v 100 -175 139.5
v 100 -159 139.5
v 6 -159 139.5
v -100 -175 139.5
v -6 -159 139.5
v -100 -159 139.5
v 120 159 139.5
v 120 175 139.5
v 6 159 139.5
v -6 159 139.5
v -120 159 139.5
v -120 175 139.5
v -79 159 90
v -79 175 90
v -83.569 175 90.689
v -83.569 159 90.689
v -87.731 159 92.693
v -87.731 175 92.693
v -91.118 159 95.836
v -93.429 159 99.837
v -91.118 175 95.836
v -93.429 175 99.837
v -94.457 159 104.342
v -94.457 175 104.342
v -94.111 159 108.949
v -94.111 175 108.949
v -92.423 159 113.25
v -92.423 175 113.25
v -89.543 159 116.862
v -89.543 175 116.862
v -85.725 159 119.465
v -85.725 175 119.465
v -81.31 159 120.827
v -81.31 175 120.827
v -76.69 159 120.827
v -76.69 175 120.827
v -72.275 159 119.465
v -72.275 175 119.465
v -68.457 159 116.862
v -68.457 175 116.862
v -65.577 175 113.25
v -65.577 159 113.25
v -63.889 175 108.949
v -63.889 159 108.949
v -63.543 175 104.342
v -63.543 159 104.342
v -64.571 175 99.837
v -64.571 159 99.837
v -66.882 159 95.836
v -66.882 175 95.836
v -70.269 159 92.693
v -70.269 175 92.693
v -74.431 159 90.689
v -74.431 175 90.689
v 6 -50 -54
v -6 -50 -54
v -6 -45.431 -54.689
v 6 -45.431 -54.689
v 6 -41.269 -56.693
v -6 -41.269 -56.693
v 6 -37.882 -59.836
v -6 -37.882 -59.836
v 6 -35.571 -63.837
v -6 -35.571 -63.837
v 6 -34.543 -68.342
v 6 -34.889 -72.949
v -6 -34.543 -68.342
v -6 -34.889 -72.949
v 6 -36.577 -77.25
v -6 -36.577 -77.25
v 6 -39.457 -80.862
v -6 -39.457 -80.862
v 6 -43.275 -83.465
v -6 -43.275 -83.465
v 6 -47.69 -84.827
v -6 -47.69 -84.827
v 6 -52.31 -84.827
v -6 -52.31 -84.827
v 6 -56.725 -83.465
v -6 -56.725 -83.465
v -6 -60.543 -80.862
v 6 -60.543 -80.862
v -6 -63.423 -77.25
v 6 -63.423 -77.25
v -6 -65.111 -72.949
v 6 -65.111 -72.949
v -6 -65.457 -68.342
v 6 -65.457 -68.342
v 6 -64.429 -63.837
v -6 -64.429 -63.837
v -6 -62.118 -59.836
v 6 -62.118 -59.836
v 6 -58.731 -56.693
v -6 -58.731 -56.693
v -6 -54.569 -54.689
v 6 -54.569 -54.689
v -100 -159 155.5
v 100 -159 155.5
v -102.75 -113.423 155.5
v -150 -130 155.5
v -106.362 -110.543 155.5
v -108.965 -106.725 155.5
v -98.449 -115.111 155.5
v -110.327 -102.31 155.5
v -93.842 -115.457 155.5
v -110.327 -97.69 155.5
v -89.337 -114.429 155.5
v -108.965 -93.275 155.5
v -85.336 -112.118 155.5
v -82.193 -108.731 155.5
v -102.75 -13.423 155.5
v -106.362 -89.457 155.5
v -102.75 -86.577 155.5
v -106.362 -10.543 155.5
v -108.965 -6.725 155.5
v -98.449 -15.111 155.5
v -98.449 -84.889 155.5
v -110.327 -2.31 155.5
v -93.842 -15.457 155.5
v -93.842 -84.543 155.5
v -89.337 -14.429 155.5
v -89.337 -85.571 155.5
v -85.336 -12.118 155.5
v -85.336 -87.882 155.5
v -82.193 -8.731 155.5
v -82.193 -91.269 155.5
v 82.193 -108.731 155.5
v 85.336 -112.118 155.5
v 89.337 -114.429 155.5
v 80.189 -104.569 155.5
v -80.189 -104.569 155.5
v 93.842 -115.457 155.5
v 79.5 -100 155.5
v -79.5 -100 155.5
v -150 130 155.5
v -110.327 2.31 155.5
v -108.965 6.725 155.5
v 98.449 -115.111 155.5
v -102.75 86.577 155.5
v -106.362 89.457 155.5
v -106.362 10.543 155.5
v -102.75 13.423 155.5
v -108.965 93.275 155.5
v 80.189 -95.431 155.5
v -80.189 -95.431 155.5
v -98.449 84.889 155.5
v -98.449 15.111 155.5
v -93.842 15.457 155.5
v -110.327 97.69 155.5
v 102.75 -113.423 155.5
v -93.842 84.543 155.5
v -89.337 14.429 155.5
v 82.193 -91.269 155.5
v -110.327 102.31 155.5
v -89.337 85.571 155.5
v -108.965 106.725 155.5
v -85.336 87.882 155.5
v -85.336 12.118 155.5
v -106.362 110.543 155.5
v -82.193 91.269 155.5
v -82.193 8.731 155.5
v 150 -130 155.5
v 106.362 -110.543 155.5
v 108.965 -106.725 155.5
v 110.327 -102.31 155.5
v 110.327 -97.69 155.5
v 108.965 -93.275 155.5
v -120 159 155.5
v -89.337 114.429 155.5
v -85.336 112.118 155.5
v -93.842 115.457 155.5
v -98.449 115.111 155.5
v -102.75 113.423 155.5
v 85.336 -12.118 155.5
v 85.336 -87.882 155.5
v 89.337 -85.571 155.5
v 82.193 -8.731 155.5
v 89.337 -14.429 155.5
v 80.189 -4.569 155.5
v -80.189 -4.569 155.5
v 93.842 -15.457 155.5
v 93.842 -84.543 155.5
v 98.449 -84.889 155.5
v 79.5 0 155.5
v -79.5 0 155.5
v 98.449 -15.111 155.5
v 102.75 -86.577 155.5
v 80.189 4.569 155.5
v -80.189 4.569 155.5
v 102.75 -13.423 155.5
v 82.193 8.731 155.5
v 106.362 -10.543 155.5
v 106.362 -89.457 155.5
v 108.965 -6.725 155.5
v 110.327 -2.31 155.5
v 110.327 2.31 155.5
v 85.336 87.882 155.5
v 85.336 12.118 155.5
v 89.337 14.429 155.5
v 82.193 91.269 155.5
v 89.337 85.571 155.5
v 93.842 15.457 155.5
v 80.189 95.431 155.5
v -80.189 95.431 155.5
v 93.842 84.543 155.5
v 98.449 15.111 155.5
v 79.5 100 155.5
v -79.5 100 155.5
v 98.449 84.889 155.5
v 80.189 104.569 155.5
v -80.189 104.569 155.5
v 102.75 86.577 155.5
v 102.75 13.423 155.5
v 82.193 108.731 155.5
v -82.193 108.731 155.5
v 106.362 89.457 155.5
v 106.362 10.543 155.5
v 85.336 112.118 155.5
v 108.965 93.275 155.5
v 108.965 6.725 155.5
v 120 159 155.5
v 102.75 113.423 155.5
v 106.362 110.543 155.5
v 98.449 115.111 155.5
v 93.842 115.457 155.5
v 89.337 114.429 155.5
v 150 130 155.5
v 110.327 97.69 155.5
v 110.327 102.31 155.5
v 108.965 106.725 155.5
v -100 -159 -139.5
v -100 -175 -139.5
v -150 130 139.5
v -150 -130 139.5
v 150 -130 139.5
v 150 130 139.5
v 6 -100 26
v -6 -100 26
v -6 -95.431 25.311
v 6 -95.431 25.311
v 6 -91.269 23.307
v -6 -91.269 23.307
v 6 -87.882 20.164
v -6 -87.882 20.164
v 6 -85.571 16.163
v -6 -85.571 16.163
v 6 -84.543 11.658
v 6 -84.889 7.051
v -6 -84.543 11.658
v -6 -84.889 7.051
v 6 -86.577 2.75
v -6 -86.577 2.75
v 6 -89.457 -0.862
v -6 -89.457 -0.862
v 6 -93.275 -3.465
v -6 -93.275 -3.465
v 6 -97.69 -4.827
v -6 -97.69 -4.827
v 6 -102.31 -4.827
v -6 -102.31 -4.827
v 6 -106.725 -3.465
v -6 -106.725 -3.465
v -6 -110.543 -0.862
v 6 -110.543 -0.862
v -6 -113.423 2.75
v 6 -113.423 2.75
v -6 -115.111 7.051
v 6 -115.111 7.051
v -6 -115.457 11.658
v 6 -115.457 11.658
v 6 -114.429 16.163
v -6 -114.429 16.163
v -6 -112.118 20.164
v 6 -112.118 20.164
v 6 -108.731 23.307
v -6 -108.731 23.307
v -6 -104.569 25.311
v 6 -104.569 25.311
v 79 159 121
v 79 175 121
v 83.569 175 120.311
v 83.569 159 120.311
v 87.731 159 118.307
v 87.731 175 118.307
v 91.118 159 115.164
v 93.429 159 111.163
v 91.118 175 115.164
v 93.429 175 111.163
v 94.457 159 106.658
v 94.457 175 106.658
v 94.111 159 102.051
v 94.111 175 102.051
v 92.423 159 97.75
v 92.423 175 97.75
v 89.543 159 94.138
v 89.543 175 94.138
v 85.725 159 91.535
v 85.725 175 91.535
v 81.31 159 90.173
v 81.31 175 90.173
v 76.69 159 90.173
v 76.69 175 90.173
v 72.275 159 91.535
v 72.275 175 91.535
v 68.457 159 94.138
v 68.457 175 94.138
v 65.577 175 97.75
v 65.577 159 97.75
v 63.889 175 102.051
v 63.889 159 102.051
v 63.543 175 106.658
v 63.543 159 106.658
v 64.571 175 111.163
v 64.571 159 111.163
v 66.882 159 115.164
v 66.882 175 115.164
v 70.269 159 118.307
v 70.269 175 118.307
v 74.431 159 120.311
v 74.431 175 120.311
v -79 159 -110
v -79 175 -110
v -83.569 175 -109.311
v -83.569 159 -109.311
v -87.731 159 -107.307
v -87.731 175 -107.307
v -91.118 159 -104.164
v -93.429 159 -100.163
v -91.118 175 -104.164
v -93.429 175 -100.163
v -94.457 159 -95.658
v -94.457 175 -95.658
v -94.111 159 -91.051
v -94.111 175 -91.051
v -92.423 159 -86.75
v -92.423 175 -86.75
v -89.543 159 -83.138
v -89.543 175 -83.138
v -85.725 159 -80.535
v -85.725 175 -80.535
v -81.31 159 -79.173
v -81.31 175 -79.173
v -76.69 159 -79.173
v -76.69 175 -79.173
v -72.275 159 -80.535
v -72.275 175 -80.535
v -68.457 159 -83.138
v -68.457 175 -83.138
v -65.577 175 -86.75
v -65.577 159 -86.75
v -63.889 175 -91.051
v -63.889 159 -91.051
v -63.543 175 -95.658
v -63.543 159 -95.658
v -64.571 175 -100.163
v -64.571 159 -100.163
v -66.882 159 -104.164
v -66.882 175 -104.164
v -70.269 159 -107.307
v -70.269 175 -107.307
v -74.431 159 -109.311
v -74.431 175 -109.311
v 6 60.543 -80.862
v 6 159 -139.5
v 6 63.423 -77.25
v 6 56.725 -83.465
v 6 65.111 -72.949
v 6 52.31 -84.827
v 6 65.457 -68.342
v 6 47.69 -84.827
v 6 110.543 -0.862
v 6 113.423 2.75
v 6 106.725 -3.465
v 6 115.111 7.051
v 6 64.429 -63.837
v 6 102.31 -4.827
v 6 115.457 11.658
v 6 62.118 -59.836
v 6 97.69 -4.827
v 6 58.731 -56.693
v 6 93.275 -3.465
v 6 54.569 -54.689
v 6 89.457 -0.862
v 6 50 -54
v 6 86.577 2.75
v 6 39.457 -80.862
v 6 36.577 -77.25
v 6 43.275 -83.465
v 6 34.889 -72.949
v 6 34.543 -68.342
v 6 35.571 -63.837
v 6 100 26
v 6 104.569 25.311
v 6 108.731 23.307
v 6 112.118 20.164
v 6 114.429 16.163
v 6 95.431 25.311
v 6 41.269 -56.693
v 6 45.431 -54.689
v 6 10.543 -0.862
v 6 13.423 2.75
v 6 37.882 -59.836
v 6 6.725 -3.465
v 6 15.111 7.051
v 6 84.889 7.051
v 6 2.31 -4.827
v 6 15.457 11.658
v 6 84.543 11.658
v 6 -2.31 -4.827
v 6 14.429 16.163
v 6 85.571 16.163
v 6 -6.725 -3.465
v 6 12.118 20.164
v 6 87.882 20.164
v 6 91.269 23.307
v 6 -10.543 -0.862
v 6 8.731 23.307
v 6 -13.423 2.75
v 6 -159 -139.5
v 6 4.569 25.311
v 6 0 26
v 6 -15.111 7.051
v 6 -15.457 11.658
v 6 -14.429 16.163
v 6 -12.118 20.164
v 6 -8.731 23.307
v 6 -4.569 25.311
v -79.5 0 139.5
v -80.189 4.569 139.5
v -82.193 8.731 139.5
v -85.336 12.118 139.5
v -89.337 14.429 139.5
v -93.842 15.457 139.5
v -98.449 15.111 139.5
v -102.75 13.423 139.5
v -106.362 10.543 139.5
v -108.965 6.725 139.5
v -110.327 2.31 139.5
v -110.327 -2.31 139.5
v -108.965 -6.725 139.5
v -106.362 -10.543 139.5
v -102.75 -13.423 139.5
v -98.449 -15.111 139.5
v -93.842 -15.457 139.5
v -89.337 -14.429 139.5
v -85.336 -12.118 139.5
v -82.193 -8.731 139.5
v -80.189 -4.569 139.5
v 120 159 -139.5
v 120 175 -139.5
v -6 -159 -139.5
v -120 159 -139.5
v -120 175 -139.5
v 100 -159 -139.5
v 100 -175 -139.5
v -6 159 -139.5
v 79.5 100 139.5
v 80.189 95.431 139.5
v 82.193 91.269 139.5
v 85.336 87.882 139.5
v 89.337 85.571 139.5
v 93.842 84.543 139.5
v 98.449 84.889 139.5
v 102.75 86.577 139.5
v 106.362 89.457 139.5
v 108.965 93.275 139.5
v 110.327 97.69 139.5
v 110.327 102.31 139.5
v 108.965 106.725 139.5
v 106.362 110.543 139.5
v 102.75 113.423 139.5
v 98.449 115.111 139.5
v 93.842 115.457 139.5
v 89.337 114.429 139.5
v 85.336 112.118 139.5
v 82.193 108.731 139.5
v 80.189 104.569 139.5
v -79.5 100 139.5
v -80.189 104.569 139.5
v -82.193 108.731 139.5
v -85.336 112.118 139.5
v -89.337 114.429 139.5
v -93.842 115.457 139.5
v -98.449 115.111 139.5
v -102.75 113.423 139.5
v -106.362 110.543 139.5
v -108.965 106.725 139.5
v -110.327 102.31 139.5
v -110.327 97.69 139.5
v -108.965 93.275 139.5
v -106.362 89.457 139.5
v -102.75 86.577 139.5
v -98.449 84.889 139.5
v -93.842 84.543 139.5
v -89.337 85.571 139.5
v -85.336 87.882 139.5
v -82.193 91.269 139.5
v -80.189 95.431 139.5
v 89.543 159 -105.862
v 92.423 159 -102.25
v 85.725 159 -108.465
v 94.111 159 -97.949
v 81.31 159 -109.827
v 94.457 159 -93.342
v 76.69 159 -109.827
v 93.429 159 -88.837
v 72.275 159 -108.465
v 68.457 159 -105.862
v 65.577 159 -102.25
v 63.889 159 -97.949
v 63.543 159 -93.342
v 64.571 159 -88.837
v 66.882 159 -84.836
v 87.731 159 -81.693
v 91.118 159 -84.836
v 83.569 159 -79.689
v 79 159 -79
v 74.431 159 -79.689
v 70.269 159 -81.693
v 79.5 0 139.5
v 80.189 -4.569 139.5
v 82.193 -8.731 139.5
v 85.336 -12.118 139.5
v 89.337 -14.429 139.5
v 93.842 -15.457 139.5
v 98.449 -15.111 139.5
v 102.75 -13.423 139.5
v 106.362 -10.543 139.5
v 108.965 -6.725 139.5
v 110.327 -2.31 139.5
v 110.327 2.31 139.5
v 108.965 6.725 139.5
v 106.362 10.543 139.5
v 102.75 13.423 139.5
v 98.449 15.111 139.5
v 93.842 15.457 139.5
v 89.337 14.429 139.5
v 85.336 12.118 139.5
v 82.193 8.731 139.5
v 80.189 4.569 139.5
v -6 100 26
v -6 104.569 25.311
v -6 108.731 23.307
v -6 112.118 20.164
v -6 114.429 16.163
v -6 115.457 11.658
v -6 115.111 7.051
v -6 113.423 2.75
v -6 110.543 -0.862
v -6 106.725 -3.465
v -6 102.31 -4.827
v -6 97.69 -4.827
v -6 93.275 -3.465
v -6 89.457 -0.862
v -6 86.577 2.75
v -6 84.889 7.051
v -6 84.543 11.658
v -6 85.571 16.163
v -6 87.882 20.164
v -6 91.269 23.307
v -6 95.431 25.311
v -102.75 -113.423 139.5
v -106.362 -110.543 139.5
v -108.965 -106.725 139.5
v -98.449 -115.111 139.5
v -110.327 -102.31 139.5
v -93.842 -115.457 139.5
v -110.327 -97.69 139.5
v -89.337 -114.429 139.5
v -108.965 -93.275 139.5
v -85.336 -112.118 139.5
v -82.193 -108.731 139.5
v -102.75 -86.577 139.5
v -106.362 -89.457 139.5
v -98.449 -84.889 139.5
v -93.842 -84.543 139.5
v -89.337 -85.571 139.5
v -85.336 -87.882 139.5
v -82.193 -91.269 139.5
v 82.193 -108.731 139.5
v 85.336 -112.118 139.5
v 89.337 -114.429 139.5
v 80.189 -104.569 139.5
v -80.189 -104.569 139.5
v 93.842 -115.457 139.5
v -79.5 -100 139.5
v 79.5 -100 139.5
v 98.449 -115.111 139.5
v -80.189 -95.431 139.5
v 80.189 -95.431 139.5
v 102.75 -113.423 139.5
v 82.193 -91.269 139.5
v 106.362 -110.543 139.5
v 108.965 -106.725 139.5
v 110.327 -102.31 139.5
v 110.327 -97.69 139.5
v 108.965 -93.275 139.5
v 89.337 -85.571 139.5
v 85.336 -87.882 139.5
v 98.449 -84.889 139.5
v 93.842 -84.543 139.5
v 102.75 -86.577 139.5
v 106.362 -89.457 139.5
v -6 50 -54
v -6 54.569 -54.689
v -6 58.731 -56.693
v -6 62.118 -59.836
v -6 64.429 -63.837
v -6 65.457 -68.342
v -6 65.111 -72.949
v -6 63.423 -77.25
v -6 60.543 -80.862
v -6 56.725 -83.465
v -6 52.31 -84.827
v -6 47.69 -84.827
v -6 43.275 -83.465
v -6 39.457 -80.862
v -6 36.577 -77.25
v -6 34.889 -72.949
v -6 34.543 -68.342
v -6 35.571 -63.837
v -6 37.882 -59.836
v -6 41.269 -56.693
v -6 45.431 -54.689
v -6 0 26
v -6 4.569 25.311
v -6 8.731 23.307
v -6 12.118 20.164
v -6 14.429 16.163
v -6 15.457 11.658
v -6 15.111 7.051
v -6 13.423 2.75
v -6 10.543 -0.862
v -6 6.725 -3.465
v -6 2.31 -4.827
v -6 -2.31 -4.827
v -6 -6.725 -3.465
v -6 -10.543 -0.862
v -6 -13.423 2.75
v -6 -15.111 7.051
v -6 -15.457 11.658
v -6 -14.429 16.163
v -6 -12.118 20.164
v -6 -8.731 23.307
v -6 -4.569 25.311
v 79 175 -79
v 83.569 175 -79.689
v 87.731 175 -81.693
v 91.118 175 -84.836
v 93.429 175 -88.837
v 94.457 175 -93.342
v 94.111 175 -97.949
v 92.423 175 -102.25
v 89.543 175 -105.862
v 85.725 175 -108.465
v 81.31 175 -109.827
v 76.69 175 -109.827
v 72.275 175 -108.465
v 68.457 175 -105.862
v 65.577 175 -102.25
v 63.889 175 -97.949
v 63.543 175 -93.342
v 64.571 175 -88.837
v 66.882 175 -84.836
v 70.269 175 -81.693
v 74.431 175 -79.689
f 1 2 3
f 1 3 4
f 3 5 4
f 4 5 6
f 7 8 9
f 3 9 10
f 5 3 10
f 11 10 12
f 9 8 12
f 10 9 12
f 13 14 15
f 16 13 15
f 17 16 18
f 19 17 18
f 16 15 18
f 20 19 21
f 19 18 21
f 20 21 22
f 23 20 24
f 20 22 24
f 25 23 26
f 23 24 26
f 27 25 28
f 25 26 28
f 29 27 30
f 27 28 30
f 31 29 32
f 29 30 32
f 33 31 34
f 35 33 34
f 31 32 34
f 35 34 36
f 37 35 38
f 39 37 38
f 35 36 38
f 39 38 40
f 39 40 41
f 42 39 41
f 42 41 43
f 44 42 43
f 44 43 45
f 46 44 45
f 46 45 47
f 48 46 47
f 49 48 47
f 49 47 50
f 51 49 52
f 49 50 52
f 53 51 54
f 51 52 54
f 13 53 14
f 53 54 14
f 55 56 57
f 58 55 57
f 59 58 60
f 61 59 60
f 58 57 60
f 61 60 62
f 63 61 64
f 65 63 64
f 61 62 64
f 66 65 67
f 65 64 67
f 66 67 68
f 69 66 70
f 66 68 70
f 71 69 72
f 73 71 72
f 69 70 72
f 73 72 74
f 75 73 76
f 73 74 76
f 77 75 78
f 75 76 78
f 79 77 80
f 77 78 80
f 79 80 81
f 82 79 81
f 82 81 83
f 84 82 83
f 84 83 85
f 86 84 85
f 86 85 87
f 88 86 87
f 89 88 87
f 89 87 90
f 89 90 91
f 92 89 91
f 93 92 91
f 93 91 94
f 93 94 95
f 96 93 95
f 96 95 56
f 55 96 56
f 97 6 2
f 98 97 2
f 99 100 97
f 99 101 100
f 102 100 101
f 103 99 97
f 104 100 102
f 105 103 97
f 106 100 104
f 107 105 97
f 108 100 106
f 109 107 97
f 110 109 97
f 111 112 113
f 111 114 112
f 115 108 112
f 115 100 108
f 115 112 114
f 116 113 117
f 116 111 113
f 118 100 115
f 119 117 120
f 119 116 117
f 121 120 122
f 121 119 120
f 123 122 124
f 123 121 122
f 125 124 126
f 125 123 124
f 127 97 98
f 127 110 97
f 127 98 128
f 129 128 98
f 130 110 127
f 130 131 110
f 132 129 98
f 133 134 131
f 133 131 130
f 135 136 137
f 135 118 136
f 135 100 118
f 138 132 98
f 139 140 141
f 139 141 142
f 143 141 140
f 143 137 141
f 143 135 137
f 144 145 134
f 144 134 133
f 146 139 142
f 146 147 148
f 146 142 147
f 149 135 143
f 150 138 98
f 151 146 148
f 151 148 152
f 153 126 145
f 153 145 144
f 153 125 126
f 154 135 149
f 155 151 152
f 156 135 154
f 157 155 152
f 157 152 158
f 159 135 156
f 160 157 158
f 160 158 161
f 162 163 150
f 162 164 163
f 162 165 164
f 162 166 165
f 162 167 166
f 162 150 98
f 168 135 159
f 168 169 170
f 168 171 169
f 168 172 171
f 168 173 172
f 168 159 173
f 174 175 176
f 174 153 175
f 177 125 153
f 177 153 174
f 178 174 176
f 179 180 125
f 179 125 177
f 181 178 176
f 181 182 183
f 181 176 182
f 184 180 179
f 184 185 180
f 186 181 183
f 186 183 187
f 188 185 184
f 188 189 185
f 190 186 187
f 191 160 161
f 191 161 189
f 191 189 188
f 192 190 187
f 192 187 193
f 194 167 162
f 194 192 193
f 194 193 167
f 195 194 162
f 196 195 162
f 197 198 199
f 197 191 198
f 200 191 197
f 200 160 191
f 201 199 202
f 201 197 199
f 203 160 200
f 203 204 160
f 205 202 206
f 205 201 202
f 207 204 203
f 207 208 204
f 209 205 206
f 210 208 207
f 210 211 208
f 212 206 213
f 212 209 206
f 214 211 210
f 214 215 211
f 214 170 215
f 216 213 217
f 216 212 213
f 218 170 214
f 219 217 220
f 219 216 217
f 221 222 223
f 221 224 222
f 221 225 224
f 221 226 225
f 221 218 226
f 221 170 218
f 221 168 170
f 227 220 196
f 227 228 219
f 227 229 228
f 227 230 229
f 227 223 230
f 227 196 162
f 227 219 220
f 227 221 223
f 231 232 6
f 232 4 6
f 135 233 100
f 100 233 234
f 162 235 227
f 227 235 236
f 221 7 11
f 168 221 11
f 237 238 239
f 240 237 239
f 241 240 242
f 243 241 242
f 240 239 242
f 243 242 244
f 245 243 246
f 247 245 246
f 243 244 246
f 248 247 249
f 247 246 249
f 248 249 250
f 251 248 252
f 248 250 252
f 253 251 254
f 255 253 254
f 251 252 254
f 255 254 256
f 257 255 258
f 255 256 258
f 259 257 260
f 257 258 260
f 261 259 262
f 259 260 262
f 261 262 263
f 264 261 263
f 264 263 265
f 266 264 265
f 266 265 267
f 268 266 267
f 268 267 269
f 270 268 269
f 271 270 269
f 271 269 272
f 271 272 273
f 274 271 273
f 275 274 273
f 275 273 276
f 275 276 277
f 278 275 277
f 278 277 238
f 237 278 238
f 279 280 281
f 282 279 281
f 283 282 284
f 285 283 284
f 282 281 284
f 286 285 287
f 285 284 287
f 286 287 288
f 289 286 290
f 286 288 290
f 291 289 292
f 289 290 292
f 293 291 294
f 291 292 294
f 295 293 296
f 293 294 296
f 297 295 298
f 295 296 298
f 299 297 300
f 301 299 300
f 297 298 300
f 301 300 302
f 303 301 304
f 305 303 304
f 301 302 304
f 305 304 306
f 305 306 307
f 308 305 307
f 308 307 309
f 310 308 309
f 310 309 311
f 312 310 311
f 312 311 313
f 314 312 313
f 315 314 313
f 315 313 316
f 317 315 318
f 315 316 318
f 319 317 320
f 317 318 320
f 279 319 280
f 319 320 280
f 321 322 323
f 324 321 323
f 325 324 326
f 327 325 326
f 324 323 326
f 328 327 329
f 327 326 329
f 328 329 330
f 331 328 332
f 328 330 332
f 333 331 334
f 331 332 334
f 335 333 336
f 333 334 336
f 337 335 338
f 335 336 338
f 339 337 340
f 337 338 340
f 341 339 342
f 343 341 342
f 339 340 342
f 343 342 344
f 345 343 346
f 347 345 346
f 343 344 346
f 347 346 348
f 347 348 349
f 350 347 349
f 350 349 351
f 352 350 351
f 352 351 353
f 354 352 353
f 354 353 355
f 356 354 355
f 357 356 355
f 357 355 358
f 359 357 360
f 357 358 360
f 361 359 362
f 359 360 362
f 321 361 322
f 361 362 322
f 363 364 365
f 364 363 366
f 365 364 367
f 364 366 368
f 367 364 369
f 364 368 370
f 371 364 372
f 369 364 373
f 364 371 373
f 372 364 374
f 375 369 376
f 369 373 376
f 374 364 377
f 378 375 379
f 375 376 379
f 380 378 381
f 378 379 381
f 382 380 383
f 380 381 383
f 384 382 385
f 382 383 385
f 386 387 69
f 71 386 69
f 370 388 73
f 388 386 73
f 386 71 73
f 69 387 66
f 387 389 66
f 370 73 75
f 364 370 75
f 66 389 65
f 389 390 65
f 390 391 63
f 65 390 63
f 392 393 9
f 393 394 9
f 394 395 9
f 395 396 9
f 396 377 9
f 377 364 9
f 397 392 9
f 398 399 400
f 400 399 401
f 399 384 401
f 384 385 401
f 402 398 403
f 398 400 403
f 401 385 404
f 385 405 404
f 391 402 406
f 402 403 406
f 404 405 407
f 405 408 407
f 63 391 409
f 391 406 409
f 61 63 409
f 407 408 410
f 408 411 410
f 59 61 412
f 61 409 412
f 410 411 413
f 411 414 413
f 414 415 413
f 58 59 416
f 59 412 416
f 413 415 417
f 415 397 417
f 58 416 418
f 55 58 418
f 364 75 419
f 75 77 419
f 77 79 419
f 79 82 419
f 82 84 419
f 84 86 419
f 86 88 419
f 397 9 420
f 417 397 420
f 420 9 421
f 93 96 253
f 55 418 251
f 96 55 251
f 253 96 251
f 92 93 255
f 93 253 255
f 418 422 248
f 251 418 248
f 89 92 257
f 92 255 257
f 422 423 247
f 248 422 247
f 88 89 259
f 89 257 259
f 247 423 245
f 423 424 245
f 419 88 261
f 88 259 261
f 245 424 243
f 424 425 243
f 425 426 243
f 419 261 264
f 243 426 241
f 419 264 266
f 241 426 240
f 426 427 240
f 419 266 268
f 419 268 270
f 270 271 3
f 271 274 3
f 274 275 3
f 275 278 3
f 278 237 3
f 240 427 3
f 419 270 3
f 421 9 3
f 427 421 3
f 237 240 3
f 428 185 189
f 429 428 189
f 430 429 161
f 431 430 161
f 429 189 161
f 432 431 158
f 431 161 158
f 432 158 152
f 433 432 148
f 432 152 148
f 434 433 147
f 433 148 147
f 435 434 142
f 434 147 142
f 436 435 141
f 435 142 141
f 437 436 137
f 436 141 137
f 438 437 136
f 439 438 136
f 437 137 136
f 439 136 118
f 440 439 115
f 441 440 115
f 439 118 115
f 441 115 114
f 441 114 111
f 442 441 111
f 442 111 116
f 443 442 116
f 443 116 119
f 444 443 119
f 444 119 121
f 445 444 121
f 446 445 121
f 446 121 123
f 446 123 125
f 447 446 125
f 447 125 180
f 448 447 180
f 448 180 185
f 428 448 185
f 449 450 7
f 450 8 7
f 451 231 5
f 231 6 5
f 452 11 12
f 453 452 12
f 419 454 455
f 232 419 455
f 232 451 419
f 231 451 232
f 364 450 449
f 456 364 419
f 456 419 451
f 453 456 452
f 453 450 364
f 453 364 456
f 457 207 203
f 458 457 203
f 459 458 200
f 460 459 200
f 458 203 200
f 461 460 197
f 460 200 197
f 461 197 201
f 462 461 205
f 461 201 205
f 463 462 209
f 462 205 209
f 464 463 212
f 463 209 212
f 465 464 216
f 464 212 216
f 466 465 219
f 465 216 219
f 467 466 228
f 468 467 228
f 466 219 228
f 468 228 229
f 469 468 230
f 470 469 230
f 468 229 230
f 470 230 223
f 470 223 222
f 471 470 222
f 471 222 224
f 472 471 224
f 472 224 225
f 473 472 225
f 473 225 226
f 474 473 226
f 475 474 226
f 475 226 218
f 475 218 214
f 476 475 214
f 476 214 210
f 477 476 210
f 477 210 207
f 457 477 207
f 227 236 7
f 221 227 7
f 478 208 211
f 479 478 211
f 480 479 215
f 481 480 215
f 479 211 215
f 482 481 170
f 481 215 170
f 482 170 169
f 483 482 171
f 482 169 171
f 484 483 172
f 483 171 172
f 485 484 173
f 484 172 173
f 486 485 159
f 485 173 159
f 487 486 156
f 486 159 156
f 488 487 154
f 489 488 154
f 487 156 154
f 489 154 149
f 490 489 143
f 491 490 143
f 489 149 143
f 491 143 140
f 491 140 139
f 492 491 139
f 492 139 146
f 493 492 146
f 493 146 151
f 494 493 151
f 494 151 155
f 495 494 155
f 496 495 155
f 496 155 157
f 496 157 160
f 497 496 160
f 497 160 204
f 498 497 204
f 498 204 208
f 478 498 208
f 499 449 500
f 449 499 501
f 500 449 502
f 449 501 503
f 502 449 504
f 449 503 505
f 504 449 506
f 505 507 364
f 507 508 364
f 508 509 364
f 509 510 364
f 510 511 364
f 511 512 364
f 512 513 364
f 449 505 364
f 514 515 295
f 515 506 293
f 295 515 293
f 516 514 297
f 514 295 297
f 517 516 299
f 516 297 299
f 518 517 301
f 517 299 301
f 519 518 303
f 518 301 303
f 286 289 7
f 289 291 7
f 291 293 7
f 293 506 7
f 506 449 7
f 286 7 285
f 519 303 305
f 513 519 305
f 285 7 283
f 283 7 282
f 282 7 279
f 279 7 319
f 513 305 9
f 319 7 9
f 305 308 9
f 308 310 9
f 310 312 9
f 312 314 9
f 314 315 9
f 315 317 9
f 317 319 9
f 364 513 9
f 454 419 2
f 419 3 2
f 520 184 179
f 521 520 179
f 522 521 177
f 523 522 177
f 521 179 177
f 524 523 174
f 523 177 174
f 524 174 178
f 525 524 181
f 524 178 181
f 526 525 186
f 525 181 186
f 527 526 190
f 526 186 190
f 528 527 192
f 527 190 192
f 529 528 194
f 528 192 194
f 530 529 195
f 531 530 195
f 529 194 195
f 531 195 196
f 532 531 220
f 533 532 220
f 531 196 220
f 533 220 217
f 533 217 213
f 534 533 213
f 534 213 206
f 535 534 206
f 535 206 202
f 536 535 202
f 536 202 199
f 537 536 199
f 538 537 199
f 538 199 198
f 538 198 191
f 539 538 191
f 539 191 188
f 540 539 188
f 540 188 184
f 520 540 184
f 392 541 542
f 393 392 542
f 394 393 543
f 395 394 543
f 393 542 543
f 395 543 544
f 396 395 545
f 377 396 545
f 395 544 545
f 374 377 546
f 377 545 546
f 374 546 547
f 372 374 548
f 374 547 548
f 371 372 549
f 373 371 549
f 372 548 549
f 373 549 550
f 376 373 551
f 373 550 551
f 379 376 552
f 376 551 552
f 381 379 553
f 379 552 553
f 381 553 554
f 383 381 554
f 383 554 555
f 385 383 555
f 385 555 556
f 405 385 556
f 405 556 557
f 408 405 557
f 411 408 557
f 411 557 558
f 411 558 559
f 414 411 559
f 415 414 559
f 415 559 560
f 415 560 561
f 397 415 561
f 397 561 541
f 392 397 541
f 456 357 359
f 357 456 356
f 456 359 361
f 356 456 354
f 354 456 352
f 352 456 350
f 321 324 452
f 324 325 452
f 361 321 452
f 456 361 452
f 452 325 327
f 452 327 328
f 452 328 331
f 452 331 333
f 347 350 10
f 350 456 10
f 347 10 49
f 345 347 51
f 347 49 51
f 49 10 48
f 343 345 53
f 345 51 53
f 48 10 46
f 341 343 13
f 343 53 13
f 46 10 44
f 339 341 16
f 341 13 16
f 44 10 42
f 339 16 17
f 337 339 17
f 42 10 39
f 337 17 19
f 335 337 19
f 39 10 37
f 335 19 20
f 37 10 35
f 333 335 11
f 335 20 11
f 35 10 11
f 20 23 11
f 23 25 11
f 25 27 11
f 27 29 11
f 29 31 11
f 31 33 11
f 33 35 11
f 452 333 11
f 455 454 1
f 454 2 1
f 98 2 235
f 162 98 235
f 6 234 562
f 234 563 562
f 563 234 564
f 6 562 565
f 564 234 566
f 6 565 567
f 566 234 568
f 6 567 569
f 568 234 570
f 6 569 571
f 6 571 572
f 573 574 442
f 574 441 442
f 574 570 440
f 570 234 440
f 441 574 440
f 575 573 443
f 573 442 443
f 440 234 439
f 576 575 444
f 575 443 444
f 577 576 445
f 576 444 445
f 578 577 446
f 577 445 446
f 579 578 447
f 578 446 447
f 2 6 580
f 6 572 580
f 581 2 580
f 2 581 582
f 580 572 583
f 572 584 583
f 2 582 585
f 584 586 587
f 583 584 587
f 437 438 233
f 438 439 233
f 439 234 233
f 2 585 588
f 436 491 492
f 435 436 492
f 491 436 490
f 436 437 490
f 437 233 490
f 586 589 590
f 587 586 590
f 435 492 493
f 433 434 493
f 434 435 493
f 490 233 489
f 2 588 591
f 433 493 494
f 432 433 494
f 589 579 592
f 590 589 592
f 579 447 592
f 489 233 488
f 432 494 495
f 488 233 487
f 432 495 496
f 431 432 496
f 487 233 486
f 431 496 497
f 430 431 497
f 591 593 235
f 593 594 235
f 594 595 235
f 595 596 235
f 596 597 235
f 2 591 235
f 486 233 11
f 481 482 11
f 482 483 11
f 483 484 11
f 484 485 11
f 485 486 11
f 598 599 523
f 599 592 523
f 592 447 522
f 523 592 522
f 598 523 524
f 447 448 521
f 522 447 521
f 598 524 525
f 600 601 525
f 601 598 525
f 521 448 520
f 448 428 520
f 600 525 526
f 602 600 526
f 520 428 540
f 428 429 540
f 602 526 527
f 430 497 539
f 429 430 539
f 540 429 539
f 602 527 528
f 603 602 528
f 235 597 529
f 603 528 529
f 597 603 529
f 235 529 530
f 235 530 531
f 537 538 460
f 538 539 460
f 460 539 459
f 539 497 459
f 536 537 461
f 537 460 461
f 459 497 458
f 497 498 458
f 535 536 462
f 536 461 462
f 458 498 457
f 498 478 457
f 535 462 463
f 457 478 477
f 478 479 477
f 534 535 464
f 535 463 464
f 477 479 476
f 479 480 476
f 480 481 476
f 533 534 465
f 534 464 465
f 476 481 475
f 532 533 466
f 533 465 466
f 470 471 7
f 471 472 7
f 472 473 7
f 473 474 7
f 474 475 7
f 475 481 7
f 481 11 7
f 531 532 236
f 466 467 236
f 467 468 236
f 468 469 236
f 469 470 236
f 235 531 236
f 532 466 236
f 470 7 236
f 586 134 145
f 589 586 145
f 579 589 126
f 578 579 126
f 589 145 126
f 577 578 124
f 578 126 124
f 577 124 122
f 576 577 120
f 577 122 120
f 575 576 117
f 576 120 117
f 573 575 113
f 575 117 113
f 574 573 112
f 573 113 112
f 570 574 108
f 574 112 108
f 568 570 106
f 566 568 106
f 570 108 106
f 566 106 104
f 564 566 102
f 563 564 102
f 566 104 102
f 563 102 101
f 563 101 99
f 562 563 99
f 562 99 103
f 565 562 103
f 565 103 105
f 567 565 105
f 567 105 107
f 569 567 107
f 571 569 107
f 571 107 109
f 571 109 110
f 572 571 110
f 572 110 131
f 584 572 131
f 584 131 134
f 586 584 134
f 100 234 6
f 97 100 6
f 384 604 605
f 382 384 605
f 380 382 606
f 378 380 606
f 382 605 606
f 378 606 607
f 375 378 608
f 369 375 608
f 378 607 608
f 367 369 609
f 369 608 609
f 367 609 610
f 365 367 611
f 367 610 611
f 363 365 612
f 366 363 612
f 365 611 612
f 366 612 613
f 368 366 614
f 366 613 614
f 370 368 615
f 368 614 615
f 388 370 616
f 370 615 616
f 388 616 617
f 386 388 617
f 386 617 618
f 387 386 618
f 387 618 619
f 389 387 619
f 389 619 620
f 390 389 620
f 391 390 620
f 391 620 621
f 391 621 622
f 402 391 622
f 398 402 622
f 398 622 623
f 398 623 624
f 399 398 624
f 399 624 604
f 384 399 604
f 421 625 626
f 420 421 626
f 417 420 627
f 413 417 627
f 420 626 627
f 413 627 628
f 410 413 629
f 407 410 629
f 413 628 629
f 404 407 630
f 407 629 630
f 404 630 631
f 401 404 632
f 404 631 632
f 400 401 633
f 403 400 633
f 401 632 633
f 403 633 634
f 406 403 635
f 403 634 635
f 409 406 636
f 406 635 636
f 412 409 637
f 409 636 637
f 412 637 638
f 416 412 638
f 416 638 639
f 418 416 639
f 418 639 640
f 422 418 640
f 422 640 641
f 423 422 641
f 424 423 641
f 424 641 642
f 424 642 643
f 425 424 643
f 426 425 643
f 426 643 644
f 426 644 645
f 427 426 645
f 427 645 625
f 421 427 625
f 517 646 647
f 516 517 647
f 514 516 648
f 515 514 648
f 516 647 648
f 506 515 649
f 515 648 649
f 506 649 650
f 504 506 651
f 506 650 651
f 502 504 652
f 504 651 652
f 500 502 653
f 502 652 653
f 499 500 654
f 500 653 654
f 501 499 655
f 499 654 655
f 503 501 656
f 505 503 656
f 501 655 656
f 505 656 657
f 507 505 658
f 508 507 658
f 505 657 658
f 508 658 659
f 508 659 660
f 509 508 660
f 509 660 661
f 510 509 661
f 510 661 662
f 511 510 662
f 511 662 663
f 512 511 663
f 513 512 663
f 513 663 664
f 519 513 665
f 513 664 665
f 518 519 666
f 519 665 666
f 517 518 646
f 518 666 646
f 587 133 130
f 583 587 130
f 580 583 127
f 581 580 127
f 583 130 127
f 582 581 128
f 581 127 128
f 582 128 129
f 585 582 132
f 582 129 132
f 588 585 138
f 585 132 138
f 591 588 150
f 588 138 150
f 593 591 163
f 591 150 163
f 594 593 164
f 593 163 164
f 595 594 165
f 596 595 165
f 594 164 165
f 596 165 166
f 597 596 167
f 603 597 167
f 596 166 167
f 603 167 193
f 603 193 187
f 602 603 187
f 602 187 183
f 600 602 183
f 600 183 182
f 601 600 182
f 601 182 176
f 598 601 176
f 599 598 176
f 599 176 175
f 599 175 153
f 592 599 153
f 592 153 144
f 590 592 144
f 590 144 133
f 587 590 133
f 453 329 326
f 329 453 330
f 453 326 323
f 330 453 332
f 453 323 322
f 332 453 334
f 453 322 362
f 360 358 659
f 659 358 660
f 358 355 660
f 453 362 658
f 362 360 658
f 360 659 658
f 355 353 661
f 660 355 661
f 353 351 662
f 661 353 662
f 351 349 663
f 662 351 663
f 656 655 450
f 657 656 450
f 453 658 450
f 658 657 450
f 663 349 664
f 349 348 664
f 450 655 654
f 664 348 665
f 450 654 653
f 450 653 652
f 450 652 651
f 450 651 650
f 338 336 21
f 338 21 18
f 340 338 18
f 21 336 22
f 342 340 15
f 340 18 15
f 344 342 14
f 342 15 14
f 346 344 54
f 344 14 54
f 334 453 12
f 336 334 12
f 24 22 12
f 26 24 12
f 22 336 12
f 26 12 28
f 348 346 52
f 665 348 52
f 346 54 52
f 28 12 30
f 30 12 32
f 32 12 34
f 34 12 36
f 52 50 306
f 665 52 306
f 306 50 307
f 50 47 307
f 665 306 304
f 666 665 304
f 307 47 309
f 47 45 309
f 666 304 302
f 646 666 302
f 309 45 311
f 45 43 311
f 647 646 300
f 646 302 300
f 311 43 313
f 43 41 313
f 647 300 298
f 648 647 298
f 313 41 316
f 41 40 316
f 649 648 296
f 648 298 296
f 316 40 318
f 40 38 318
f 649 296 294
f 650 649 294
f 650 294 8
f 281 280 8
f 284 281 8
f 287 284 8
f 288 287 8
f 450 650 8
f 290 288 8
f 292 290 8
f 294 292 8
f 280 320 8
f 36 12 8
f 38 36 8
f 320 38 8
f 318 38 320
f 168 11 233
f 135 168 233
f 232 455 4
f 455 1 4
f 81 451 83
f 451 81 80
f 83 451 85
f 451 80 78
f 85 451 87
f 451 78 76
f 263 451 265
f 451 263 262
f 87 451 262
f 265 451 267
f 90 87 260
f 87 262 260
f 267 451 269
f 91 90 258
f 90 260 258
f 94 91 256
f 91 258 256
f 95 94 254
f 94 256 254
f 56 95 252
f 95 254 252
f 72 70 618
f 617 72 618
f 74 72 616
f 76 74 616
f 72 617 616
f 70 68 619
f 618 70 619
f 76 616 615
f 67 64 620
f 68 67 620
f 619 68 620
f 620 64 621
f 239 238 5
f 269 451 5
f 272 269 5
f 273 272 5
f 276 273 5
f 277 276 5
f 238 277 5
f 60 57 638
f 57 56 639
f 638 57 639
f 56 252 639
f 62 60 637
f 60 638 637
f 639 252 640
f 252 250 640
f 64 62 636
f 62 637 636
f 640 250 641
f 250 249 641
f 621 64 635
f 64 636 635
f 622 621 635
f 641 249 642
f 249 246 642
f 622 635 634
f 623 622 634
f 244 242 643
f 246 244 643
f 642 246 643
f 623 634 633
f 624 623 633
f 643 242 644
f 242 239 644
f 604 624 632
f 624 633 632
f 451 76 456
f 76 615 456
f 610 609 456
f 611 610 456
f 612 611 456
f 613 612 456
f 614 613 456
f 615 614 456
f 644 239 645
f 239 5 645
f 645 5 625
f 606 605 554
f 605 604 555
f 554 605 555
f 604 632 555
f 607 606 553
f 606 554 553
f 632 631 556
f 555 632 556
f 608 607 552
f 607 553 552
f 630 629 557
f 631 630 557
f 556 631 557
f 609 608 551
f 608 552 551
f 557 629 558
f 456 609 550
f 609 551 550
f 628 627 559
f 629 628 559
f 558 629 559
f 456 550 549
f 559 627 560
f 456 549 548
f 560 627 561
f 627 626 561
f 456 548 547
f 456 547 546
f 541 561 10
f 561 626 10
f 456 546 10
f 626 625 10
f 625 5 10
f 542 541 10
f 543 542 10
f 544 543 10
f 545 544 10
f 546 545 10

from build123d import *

# Parameters (mm, degrees)
EXTRUDE_1_DEPTH     = 139.5
EXTRUDE_2_DEPTH     = 16
SKETCH_3_R          = 15.5
CUT_EXTRUDE_3_DEPTH = 375.366130947
SKETCH_4_R          = 15.5
CUT_EXTRUDE_4_DEPTH = 16
SKETCH_5_R          = 15.5
CUT_EXTRUDE_5_DEPTH = 16


with BuildPart() as part:
    # 草图1 → 拉伸1 (new, symmetric)
    with BuildSketch(Plane.XY):
        Polygon((-120, 175), (120, 175), (120, 159), (6, 159), (6, -159), (100, -159), (100, -175), (-100, -175), (-100, -159), (-6, -159), (-6, 159), (-120, 159), align=None)
    extrude(amount=EXTRUDE_1_DEPTH, both=True)

    # 草图4 → 拉伸4 (cut)
    with BuildSketch(Plane.ZY.offset(6)):
        with Locations((10.5, 100)):
            Circle(SKETCH_4_R)
        with Locations((10.5, 0)):
            Circle(SKETCH_4_R)
        with Locations((10.5, -100)):
            Circle(SKETCH_4_R)
        with Locations((-69.5, 50)):
            Circle(SKETCH_4_R)
        with Locations((-69.5, -50)):
            Circle(SKETCH_4_R)
    extrude(amount=-CUT_EXTRUDE_4_DEPTH, mode=Mode.SUBTRACT)

    # 草图5 → 拉伸5 (cut)
    with BuildSketch(Plane(origin=(0, 175, 0), x_dir=(1, 0, 0), z_dir=(0, 1, 0))):
        with Locations(Location((79, -105.5, 0), (0, 0, 270))):
            Circle(SKETCH_5_R)
        with Locations(Location((79, 94.5, 0), (0, 0, 270))):
            Circle(SKETCH_5_R)
        with Locations(Location((-79, 94.5, 0), (0, 0, 90))):
            Circle(SKETCH_5_R)
        with Locations(Location((-79, -105.5, 0), (0, 0, 90))):
            Circle(SKETCH_5_R)
    extrude(amount=-CUT_EXTRUDE_5_DEPTH, mode=Mode.SUBTRACT)


with BuildPart() as body_2:
    # 草图2 → 拉伸2 (new body)
    with BuildSketch(Plane.XY.offset(139.5)):
        Polygon((-150, 130), (-150, -130), (-100, -159), (100, -159), (150, -130), (150, 130), (120, 159), (-120, 159), align=None)
    extrude(amount=EXTRUDE_2_DEPTH)

    # 草图3 → 拉伸3 (cut, through all)
    with BuildSketch(Plane.XY.offset(155.5)):
        with Locations((-95, 100)):
            Circle(SKETCH_3_R)
        with Locations((-95, 0)):
            Circle(SKETCH_3_R)
        with Locations((-95, -100)):
            Circle(SKETCH_3_R)
        with Locations(Location((95, -100, 0), (0, 0, 180))):
            Circle(SKETCH_3_R)
        with Locations(Location((95, 0, 0), (0, 0, 180))):
            Circle(SKETCH_3_R)
        with Locations(Location((95, 100, 0), (0, 0, 180))):
            Circle(SKETCH_3_R)
    extrude(amount=-CUT_EXTRUDE_3_DEPTH, mode=Mode.SUBTRACT)


solid = Compound([part.part, body_2.part])
